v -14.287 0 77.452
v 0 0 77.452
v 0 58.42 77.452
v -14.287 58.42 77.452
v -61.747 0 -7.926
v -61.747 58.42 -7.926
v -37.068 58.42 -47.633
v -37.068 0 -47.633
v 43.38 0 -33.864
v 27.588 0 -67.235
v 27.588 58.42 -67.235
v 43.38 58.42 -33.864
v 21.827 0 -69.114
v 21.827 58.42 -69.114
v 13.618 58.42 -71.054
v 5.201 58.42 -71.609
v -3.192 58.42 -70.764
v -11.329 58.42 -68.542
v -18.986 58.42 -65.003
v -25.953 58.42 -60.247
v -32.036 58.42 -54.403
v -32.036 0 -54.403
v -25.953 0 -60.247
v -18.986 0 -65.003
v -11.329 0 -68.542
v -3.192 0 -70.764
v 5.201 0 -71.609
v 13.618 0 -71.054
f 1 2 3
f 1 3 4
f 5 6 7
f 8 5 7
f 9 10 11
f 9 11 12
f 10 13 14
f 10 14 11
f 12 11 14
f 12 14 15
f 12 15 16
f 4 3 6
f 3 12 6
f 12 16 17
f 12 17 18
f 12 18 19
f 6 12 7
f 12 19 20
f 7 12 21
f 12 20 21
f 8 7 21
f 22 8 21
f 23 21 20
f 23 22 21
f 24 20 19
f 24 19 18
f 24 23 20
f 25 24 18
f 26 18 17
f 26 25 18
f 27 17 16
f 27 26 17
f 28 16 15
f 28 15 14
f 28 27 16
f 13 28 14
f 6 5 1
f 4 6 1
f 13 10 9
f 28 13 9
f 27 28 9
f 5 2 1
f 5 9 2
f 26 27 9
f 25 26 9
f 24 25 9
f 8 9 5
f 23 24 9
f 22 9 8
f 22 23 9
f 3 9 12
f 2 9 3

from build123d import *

# Parameters (mm, degrees)
BOSS_EXTRUDE1_DEPTH = 58.42
CHAMFER5_START      = -95.906013746
CHAMFER5_OUTLINE_W  = 100
CHAMFER5_OUTLINE_H  = 58.42
CHAMFER5_DEPTH      = 45.787595784


with BuildPart() as part:
    # Sketch1 → Boss-Extrude1 (new body)
    with BuildSketch(Plane(origin=(0, 0, 0), x_dir=(1, 0, 0), z_dir=(0, 1, 0))):
        with BuildLine():
            Line((-66.673768512, 0), (-37.067821873, 47.633329988))
            ThreePointArc((-37.067821873, 47.633329988), (-11.329209284, 68.541566023), (21.82652777, 69.113940477))
            Line((21.82652777, 69.113940477), (53.138492197, 58.903517294))
            Line((53.138492197, 58.903517294), (0, -77.45185891))
            Line((0, -77.45185891), (-66.673768512, -77.45185891))
            Line((-66.673768512, -77.45185891), (-66.673768512, 0))
        make_face()
    extrude(amount=BOSS_EXTRUDE1_DEPTH)

    # Chamfer4
    # the kernel refuses this chamfer: 25.4 mm, written as the material it takes off along each edge
    with BuildSketch(Plane(origin=(53.138492197, -68.954815123, -58.903517294), x_dir=(-0.9507298394814789, 0, -0.3100205998309166), z_dir=(0, 1, 0))) as chamfer4_piece_1:
        with BuildLine():
            Line((27.572040722, -0.738386759), (0.816641802, 27.56983389))
            Line((0.816641802, 27.56983389), (0.309449153, 27.598462833))
            ThreePointArc((0.309449153, 27.598462833), (0.269734882, 13.792739557), (-0.507192649, 0.028628943))
            Line((-0.507192649, 0.028628943), (0, -0.508))
            ThreePointArc((0, -0.508), (13.786020361, -0.508), (27.572040722, -1.246386759))
            Line((27.572040722, -1.246386759), (27.572040722, -0.738386759))
        make_face()
    extrude(amount=196.329630245, mode=Mode.SUBTRACT)

    # Chamfer5: read off the stored shape, not the designer's step
    # Chamfer5 outline → Chamfer5 (cut)
    with BuildSketch(Plane(origin=(0, 0, 0), x_dir=(0.48585842778436206, 0, 0.8740375210200692), z_dir=(0.8740375210200692, 0, -0.48585842778436206)).offset(CHAMFER5_START)):
        with Locations((12, -29.21)):
            Rectangle(CHAMFER5_OUTLINE_W, CHAMFER5_OUTLINE_H)
    extrude(amount=CHAMFER5_DEPTH, mode=Mode.SUBTRACT)


solid = part.part
